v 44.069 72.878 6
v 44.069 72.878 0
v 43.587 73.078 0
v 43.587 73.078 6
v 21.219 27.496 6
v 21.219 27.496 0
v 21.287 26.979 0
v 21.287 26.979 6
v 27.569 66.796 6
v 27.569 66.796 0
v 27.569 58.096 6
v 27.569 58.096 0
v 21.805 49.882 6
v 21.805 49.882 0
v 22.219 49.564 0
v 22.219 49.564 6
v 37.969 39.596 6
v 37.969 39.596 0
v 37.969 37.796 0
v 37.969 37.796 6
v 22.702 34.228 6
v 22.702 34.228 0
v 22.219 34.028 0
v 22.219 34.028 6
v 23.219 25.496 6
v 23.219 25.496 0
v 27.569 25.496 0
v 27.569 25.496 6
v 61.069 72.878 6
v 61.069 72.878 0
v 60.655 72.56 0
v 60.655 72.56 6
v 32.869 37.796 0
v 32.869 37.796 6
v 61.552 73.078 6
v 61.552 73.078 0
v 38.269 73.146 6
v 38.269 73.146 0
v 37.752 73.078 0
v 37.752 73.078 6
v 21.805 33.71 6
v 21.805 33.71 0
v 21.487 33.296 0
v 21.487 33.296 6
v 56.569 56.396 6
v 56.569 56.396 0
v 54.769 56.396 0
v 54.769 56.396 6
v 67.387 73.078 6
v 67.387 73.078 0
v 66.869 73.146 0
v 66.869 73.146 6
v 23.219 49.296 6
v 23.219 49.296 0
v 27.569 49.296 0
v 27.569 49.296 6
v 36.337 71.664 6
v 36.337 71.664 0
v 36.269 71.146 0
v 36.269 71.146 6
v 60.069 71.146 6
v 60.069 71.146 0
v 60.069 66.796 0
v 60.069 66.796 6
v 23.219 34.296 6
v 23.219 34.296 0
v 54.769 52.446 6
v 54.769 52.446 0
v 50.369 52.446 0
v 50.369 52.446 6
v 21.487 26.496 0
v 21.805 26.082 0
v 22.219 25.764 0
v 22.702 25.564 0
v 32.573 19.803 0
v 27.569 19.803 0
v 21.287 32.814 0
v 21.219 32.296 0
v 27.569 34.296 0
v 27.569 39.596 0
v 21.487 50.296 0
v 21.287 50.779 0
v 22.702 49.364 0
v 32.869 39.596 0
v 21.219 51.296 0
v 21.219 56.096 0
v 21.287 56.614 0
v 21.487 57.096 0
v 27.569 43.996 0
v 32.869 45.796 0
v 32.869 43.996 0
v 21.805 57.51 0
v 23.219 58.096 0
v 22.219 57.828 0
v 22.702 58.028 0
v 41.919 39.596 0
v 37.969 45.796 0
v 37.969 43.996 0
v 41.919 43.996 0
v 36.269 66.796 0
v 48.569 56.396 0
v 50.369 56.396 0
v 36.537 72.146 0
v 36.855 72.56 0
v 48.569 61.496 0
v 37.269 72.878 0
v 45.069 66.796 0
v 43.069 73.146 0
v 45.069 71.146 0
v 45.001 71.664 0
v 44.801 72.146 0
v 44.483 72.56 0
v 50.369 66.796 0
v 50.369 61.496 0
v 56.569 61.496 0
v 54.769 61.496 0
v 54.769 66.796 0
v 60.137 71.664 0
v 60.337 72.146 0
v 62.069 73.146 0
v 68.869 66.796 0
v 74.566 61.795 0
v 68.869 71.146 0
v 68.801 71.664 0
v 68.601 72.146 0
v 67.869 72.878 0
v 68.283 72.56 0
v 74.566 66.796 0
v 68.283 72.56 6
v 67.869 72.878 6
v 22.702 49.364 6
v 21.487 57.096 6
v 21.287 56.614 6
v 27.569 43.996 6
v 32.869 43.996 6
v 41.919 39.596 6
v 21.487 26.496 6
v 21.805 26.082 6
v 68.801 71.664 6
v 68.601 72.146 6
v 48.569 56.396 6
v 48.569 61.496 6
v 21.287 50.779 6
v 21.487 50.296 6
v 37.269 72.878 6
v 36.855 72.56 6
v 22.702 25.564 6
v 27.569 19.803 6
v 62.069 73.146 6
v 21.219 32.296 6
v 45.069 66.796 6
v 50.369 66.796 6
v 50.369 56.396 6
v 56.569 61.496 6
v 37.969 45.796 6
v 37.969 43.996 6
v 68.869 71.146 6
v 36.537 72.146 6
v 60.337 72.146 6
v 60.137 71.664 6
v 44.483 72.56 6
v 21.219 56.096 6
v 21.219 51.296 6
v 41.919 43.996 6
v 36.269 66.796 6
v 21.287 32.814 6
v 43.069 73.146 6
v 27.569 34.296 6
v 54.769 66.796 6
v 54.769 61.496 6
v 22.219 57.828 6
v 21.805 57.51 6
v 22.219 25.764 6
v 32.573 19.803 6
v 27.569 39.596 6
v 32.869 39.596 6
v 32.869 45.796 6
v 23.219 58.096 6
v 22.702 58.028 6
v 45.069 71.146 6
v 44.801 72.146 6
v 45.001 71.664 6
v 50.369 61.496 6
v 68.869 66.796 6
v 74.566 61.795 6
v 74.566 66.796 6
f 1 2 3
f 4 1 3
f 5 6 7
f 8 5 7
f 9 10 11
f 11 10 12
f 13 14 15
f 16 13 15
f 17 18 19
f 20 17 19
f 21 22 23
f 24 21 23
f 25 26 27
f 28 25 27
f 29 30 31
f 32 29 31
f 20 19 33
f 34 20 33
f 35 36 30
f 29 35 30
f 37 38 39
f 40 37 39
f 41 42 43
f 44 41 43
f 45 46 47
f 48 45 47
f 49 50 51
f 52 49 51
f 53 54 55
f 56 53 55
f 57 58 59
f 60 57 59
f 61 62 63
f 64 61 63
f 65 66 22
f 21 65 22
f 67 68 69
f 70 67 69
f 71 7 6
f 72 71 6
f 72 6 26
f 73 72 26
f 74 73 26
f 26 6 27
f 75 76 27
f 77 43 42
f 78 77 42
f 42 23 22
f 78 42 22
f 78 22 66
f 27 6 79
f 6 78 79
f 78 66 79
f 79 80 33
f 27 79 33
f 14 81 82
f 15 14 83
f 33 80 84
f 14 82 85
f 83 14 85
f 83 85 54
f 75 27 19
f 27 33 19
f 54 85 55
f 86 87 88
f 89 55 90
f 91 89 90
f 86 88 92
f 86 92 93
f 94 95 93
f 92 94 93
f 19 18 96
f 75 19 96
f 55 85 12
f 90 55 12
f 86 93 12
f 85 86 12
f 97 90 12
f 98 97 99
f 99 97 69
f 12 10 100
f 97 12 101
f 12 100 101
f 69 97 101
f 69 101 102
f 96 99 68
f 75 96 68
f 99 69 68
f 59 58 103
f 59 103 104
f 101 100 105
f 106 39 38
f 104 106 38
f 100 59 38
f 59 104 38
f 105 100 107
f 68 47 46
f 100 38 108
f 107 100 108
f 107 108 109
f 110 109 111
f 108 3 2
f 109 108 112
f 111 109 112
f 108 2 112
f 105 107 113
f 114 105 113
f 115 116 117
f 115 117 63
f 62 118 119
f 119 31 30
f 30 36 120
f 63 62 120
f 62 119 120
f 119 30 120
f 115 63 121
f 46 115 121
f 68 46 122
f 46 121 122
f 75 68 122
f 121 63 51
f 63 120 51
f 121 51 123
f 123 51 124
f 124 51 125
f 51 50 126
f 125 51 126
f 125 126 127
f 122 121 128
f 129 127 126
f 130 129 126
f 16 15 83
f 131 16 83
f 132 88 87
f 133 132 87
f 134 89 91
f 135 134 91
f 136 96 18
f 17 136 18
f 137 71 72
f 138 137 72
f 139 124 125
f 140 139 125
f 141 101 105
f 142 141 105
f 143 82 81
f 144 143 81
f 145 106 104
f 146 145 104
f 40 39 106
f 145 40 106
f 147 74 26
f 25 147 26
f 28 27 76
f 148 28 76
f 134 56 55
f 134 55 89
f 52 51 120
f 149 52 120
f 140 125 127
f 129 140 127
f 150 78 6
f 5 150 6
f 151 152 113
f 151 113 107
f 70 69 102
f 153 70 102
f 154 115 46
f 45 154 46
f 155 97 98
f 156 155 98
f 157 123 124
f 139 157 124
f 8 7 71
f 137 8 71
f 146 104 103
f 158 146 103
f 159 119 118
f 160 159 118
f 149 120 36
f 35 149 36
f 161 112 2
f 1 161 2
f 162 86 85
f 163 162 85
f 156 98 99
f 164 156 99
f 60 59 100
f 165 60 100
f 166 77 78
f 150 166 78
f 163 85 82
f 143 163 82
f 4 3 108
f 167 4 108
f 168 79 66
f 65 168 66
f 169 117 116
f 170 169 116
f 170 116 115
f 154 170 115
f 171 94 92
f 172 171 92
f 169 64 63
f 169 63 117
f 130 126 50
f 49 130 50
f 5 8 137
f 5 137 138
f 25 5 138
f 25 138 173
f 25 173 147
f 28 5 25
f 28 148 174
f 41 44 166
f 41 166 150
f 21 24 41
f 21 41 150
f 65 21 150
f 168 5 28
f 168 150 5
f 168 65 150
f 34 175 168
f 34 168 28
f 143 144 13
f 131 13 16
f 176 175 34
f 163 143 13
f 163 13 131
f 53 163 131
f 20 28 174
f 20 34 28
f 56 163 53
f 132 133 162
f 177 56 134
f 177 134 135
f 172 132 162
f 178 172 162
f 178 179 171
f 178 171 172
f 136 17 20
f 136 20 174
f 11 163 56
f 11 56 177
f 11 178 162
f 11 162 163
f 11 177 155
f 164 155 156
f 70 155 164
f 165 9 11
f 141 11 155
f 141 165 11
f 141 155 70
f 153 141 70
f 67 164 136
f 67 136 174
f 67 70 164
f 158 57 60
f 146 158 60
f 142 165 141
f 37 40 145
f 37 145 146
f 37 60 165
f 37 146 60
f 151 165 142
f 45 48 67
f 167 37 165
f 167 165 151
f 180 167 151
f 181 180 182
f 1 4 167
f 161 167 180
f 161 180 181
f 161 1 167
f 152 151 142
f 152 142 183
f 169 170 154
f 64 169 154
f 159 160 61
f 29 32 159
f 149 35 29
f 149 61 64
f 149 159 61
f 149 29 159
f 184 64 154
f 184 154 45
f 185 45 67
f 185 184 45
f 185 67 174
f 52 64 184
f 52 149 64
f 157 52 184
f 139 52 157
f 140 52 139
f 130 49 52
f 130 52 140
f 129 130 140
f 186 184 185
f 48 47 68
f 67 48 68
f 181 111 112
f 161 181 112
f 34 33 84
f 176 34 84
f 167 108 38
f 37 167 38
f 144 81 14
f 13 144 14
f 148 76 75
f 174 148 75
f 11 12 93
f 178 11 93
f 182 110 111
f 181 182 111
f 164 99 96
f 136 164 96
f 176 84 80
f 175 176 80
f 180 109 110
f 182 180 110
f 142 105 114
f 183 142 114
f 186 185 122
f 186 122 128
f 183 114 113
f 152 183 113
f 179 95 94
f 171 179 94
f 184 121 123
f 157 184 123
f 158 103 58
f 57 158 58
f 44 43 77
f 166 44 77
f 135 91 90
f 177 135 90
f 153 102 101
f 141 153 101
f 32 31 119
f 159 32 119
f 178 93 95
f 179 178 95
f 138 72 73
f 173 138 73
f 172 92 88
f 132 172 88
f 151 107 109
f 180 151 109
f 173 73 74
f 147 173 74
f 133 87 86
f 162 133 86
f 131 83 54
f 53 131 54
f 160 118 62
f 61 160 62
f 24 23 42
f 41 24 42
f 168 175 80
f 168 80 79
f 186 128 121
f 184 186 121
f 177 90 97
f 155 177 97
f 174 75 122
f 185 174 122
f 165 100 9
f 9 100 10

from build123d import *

# Parameters (mm, degrees)
RESSALTO_EXTRUS_O1_DEPTH = 6


with BuildPart() as part:
    # Model → Ressalto-extrusão1 (new body)
    with BuildSketch(Plane.XY):
        Polygon((37.969283539, 43.996209277), (41.919283362, 43.996209277), (41.919283362, 39.596204606), (37.969283539, 39.596204606), (37.969283539, 37.796206374), (32.869285775, 37.796206374), (32.869285775, 39.596204606), (27.569286953, 39.596204606), (27.569286953, 34.296207351), (23.219289062, 34.296207351), (22.701650972, 34.228059003), (22.219289062, 34.028258158), (21.8050755, 33.710420913), (21.487238254, 33.296207351), (21.287437409, 32.813845441), (21.219289062, 32.296207351), (21.219289062, 27.496212909), (21.287437409, 26.978574818), (21.487238254, 26.496212909), (21.8050755, 26.081999346), (22.219289062, 25.764162101), (22.701650972, 25.564361256), (23.219289062, 25.496212909), (27.569286953, 25.496212909), (27.569286953, 19.803247953), (32.573283526, 19.803247953), (74.566390822, 61.794924044), (74.566390822, 66.796199314), (68.869269338, 66.796199314), (68.869269338, 71.146197205), (68.80112099, 71.663835295), (68.601320145, 72.146197205), (68.2834829, 72.560410768), (67.869269338, 72.878248013), (67.386907428, 73.078048858), (66.869269338, 73.146197205), (62.069273373, 73.146197205), (61.551635282, 73.078048858), (61.069273373, 72.878248013), (60.65505981, 72.560410768), (60.337222565, 72.146197205), (60.13742172, 71.663835295), (60.069273373, 71.146197205), (60.069273373, 66.796199314), (54.769281366, 66.796199314), (54.769281366, 61.496200492), (56.569279598, 61.496200492), (56.569279598, 56.396202728), (54.769281366, 56.396202728), (54.769281366, 52.446202905), (50.369276694, 52.446202905), (50.369276694, 56.396202728), (48.569278462, 56.396202728), (48.569278462, 61.496200492), (50.369276694, 61.496200492), (50.369276694, 66.796199314), (45.069279439, 66.796199314), (45.069279439, 71.146197205), (45.001131092, 71.663835295), (44.801330247, 72.146197205), (44.483493001, 72.560410768), (44.069279439, 72.878248013), (43.586917529, 73.078048858), (43.069279439, 73.146197205), (38.269284997, 73.146197205), (37.751646907, 73.078048858), (37.269284997, 72.878248013), (36.855071435, 72.560410768), (36.537234189, 72.146197205), (36.337433344, 71.663835295), (36.269284997, 71.146197205), (36.269284997, 66.796199314), (27.569286953, 66.796199314), (27.569286953, 58.096197249), (23.219289062, 58.096197249), (22.701650972, 58.028048902), (22.219289062, 57.828248057), (21.8050755, 57.510410812), (21.487238254, 57.096197249), (21.287437409, 56.613835339), (21.219289062, 56.096197249), (21.219289062, 51.296201284), (21.287437409, 50.778563194), (21.487238254, 50.296201284), (21.8050755, 49.881987722), (22.219289062, 49.564150477), (22.701650972, 49.364349632), (23.219289062, 49.296201284), (27.569286953, 49.296201284), (27.569286953, 43.996209277), (32.869285775, 43.996209277), (32.869285775, 45.796207509), (37.969283539, 45.796207509), align=None)
    extrude(amount=RESSALTO_EXTRUS_O1_DEPTH)


solid = part.part
